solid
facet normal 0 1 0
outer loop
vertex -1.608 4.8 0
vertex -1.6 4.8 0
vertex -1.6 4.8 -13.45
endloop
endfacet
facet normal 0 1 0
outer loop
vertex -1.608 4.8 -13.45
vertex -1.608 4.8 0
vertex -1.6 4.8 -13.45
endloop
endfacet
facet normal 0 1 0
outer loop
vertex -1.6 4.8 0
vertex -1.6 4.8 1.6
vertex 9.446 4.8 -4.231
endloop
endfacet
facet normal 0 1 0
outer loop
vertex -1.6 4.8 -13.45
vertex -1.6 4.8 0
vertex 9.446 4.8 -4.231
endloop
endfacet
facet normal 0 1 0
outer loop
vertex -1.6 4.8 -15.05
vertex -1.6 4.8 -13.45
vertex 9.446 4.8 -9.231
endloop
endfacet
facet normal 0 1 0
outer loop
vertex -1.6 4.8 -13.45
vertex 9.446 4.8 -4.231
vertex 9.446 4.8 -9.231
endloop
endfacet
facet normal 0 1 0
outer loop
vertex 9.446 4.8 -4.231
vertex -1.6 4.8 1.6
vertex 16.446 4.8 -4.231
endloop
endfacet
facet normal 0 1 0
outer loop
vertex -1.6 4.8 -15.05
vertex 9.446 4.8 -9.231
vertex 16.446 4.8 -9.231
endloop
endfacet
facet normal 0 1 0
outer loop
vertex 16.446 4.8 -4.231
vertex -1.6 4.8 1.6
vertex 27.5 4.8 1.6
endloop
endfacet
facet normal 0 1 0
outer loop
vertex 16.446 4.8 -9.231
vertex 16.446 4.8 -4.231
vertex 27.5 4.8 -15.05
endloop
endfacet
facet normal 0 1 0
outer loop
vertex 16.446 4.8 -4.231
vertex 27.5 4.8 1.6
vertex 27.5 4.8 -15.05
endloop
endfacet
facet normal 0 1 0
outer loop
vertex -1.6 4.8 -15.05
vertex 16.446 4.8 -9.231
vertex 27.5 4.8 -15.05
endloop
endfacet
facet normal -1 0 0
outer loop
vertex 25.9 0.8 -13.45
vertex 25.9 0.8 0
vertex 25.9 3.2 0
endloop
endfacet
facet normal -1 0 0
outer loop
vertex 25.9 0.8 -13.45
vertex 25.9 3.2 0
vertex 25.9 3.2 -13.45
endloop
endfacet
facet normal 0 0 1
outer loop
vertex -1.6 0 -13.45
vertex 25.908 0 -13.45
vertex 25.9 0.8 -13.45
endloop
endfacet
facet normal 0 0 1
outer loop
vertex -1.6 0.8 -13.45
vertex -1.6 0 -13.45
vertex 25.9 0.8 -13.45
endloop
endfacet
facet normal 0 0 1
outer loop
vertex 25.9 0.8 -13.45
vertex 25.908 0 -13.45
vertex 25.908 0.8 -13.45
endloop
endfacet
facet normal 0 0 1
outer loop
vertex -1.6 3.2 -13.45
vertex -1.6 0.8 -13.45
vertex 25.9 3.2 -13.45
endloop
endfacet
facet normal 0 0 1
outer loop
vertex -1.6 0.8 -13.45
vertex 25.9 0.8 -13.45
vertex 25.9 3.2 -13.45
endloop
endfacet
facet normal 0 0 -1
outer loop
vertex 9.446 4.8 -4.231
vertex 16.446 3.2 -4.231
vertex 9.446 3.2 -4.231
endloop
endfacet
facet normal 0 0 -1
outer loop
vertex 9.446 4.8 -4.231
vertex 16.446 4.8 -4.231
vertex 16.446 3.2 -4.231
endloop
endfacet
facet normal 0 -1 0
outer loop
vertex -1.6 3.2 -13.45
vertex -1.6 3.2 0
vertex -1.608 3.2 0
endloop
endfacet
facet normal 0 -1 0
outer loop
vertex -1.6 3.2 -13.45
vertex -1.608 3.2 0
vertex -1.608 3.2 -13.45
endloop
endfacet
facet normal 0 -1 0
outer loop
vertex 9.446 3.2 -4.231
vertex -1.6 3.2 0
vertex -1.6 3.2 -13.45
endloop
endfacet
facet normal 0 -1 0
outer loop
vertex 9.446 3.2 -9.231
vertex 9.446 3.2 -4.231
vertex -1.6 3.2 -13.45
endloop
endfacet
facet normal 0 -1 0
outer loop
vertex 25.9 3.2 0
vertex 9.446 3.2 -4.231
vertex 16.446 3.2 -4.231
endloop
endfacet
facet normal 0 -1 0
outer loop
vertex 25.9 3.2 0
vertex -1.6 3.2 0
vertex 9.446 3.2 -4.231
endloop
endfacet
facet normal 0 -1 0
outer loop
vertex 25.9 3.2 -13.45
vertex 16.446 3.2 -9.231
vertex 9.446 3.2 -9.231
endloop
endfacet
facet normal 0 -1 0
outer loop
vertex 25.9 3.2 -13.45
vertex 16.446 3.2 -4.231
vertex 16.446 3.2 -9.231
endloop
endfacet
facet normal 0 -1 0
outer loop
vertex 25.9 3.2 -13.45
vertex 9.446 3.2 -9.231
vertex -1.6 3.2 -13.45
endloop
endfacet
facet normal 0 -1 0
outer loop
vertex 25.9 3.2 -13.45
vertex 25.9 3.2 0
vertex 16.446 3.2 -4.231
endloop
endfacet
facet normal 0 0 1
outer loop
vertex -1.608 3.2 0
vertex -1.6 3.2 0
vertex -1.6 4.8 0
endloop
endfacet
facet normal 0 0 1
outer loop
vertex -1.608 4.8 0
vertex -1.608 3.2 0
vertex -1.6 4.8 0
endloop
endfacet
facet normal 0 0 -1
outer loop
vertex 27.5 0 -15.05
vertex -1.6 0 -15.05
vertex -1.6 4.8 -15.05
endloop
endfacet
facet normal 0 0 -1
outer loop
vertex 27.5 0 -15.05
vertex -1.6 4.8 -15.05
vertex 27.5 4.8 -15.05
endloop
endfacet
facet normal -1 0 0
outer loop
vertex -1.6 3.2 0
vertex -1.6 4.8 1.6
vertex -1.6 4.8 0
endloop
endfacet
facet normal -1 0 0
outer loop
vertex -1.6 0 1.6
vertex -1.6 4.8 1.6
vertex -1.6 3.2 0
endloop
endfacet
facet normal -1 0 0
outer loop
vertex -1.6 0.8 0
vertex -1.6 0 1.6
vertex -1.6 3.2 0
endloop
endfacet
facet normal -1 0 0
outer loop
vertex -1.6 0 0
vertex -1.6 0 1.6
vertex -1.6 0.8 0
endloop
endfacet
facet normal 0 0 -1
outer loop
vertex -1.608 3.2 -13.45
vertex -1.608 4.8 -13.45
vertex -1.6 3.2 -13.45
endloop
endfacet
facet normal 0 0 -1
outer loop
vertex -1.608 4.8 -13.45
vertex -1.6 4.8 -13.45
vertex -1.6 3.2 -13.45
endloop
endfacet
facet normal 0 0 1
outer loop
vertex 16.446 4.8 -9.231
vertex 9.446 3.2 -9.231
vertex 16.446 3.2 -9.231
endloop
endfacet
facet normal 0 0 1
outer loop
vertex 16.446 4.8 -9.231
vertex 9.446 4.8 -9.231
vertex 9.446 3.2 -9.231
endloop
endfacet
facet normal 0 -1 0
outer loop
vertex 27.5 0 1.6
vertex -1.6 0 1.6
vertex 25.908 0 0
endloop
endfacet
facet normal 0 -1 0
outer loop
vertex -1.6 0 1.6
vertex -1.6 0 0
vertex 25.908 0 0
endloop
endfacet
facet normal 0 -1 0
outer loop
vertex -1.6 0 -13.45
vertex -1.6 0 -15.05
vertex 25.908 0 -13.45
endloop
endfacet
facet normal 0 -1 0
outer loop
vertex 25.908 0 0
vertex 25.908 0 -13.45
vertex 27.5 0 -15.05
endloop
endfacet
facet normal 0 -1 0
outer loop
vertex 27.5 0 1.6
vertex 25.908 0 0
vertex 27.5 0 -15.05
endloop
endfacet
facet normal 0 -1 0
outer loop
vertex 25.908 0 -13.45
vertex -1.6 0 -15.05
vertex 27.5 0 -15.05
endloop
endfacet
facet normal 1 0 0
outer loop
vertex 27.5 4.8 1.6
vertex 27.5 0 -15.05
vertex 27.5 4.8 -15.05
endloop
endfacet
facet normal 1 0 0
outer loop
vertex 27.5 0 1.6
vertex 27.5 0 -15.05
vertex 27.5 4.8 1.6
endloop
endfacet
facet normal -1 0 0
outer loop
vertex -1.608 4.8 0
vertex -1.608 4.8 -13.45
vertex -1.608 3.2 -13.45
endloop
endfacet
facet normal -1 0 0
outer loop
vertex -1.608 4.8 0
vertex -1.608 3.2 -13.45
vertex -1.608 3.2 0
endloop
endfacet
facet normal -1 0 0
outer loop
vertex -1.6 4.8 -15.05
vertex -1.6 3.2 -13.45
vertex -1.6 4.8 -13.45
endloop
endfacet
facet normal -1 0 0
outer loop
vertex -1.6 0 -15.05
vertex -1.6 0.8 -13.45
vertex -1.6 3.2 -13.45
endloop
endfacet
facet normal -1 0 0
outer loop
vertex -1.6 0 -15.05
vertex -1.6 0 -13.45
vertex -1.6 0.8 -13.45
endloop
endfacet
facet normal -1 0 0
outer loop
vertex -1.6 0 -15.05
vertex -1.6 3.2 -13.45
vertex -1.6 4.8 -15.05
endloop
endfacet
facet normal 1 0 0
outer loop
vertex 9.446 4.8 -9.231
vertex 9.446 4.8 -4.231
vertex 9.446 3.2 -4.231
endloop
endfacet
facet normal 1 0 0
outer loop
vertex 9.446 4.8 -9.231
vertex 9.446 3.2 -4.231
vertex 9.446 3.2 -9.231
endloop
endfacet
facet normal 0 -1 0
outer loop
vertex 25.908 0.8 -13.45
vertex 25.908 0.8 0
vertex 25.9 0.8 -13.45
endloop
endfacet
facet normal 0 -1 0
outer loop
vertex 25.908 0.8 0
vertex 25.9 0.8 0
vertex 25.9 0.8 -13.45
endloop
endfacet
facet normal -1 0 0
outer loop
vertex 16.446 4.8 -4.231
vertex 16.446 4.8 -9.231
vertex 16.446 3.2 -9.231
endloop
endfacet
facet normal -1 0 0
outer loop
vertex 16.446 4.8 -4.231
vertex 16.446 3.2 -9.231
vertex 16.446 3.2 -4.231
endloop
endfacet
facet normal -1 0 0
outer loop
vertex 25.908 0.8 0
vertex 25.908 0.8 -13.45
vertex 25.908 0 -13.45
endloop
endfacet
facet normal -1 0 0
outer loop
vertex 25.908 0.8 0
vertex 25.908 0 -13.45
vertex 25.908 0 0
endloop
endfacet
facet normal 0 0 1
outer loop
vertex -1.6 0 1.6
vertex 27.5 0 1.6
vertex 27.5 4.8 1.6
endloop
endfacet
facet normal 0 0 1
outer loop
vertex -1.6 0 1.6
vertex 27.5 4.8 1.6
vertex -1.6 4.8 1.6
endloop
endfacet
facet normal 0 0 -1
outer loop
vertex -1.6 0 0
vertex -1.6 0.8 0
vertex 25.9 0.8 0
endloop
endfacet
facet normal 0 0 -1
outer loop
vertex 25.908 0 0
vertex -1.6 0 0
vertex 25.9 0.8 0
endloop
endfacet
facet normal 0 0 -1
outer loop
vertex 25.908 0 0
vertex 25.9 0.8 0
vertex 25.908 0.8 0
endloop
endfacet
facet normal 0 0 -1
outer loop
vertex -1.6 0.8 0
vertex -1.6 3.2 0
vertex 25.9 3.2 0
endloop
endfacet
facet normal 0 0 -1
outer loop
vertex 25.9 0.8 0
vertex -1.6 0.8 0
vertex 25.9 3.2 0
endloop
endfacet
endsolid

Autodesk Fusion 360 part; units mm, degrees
sketch "Sketch1" plane through (0, 0, 0) normal (0, 1, 0) x (1, 0, 0)
  line L0 (0, 0) -> (25.9, 0)
  line L1 (25.9, 0) -> (25.9, 13.45)
  line L2 (25.9, 13.45) -> (0, 13.45)
  line L3 (0, 13.45) -> (0, 0)
  line L4 (-1.6, 15.05) -> (27.5, 15.05)
  line L5 (27.5, 15.05) -> (27.5, -1.6)
  line L6 (27.5, -1.6) -> (-1.6, -1.6)
  line L7 (-1.6, -1.6) -> (-1.6, 15.05)
  dimension "d1" = 25.9
  dimension "d2" = 13.45
  dimension "d3" = 1.6
  dimension "d4" = 1.6
  dimension "d5" = 1.6
  dimension "d6" = 1.6
extrude "Extrude1" add sketch "Sketch1" along normal blind 1.6 contours L0 L1 L2 L3 | L4 L5 L6 L7
extrude "Extrude2" add sketch "Sketch1" along normal blind 4.8
extrude "Extrude3" cut 1 faces at (0, 2.6667, -8.9667) along direction (-1, 0, 0) blind 1.6002
sketch "Sketch2" plane through (25.9, 0, 0) normal (-1, 0, 0) x (0, 0, 1)
  line L0 (-13.45, 1.6) -> (0, 1.6)
  line L1 (0, 1.6) -> (0, 4.8)
  line L2 (0, 4.8) -> (-13.45, 4.8)
  line L3 (-13.45, 4.8) -> (-13.45, 1.6)
  line L4 (-13.45, 4.8) -> (0, 4.8)
  line L5 (0, 4.8) -> (0, 3.2)
  line L6 (0, 3.2) -> (-13.45, 3.2)
  line L7 (-13.45, 3.2) -> (-13.45, 4.8)
  dimension "d13" = 1.6
extrude "Extrude4" add sketch "Sketch2" along normal blind 27.5082 contours L1 L2 L3 L4 L5 L6 L7
sketch "Sketch3" plane through (0, 4.8, 0) normal (0, 1, 0) x (-1, 0, 0)
  line L0 (1.6, 0) -> (1.6, 1.6)
  line L1 (1.6, 1.6) -> (-27.5, 1.6)
  line L2 (-27.5, 1.6) -> (-27.5, -15.05)
  line L3 (-27.5, -15.05) -> (1.6, -15.05)
  line L4 (1.6, -15.05) -> (1.6, -13.45)
  line L5 (1.6, -13.45) -> (1.6082, -13.45)
  line L6 (1.6082, -13.45) -> (1.6082, 0)
  line L7 (1.6082, 0) -> (1.6, 0)
  line L8 (-9.4458, -9.2312) -> (-16.4458, -9.2312)
  line L9 (-16.4458, -9.2312) -> (-16.4458, -4.2312)
  line L10 (-16.4458, -4.2312) -> (-9.4458, -4.2312)
  line L11 (-9.4458, -4.2312) -> (-9.4458, -9.2312)
  line L12 (-9.4458, -9.2312) -> (-12.9458, -9.2312)
  line L13 (-12.9458, -9.2312) -> (-12.9458, -6.7312)
  line L14 (-12.9458, -6.7312) -> (-9.4458, -6.7312)
  line L15 (-9.4458, -6.7312) -> (-9.4458, -9.2312)
  dimension "d16" = 7
  dimension "d17" = 5
  dimension "d18" = 16.65
  dimension "d19" = 29.1
  dimension "d20" = 14.5542
  dimension "d21" = 8.3312
extrude "Extrude5" cut sketch "Sketch3" against normal blind 2.54 contours L8 L11 L12 L13 L14 L15 | L8 L9 L10 L11 L13 L14
extrude "Extrude6" cut 1 faces at (16.7333, 1.6, -4.4833) along direction (0, -1, 0) blind 0.8
sketch "Sketch4" plane through (-1.6, 0, 0) normal (-1, 0, 0) x (0, 0, 1)
  line L0 (0, 3.2) -> (0, 0.8)
  line L1 (0, 0.8) -> (-13.45, 0.8)
  line L2 (-13.45, 0.8) -> (-13.45, 3.2)
  line L3 (-13.45, 3.2) -> (-13.45, 4.8)
  line L4 (-13.45, 4.8) -> (-15.05, 4.8)
  line L5 (-15.05, 4.8) -> (-15.05, 0)
  line L6 (-15.05, 0) -> (1.6, 0)
  line L7 (1.6, 0) -> (1.6, 4.8)
  line L8 (1.6, 4.8) -> (0, 4.8)
  line L9 (0, 4.8) -> (0, 3.2)
  line L10 (-13.45, 0.8) -> (0, 0.8)
  line L11 (0, 0.8) -> (0, 0)
  line L12 (0, 0) -> (-13.45, 0)
  line L13 (-13.45, 0) -> (-13.45, 0.8)
extrude "Extrude7" cut sketch "Sketch4" against normal blind 27.5082 contours L1 L6 L10 L11 L12 L13
equation "d9 = 1.6 * 3 mm"
equation "d20 = ( 1.146 / 2 ) * 1 in"
equation "d21 = ( 0.656 / 2 ) * 1 in"
equation "d24 = -( 1.6 / 2 ) * 1 mm"
